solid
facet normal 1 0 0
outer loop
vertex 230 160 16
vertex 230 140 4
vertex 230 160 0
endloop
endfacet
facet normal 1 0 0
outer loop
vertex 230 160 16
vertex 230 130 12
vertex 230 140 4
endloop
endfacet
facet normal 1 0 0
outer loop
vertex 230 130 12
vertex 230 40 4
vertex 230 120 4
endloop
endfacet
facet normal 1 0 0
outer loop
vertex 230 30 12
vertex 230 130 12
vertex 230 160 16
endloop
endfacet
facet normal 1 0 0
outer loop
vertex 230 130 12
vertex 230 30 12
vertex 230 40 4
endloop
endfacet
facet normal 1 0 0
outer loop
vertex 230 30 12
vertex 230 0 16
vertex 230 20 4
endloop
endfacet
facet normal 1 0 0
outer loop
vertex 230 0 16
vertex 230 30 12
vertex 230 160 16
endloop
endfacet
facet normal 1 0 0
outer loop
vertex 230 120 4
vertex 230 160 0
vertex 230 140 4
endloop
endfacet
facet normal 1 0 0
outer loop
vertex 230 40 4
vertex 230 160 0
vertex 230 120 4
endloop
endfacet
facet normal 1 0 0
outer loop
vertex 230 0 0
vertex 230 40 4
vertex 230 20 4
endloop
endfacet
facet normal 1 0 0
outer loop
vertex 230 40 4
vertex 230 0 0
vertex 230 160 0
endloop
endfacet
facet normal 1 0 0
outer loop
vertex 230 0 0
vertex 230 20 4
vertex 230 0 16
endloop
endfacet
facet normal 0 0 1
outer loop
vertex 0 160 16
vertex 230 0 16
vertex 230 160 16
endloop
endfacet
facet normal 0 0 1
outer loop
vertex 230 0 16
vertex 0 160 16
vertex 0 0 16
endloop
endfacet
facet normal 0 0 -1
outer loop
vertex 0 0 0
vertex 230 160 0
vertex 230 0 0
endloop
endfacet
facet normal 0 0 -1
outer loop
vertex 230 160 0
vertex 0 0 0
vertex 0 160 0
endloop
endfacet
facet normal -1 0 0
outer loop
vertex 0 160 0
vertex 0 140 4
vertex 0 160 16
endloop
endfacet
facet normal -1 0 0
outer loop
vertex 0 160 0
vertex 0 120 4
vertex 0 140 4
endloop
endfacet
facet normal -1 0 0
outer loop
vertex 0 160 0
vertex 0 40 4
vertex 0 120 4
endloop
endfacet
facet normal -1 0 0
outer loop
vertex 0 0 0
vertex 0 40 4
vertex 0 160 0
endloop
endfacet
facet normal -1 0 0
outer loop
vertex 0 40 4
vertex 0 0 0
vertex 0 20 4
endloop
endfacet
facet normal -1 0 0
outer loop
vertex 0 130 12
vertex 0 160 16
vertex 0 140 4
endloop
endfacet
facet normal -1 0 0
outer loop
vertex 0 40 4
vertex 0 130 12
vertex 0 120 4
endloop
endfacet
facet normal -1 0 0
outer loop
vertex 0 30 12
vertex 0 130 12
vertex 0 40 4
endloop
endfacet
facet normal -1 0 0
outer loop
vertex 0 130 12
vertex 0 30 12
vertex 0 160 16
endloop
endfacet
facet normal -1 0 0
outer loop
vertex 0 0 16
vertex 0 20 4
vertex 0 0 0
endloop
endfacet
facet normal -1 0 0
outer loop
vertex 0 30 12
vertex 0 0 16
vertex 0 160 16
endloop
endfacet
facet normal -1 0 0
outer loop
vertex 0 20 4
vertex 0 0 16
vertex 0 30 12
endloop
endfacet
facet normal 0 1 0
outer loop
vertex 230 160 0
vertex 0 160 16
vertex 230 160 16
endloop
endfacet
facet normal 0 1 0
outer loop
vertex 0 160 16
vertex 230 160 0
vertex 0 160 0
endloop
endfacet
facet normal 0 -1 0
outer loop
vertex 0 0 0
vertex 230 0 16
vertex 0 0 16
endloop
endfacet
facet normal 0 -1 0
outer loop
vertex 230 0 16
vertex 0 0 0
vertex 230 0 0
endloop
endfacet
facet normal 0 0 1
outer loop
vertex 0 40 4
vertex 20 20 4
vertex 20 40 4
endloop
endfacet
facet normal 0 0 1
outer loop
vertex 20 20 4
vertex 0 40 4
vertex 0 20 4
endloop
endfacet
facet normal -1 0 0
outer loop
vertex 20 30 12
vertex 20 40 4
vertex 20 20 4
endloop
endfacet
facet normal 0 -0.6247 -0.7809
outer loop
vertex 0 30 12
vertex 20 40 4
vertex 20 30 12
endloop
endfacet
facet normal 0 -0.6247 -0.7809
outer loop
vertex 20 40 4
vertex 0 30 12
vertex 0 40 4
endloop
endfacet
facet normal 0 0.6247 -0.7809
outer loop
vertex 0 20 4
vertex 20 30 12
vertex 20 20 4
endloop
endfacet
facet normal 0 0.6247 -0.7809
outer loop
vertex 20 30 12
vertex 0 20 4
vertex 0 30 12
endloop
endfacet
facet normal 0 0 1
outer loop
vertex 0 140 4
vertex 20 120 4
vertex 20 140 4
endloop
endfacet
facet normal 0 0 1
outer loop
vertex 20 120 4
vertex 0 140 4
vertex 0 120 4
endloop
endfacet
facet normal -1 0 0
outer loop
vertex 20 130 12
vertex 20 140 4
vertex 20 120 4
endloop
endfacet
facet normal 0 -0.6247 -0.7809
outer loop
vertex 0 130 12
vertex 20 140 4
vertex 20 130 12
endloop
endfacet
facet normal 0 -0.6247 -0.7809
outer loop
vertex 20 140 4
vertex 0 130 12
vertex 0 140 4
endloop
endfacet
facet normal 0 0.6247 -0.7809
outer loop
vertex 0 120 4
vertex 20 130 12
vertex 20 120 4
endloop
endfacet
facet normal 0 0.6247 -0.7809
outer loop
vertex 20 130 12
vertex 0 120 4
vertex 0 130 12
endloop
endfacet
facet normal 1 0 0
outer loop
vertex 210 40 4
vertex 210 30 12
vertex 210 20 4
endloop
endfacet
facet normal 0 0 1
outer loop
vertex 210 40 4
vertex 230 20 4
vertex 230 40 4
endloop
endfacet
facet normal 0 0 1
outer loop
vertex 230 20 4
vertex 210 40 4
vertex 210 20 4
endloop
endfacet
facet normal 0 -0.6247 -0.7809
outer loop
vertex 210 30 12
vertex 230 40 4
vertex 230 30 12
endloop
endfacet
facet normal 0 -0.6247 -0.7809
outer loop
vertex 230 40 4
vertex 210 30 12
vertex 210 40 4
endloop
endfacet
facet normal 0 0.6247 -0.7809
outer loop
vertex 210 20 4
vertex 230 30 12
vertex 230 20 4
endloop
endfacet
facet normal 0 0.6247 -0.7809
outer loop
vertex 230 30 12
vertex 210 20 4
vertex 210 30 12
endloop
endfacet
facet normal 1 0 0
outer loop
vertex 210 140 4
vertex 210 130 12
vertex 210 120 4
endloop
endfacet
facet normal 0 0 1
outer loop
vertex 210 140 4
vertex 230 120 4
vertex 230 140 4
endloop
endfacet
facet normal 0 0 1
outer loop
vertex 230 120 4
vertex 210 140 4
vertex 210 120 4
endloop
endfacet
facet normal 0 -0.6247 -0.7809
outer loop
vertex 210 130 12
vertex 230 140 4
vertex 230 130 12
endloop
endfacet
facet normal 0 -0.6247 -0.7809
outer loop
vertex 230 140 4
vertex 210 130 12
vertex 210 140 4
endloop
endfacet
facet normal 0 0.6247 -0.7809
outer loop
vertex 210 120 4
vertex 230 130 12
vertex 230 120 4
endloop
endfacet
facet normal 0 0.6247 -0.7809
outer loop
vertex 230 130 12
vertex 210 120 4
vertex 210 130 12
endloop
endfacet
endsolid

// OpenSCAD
$fn = 48;


difference() {
	cube(size = [230, 160, 16]);
	translate(v = [0, 20, 4.0000000000]) {
		rotate(a = [90, 0, 0]) {
			rotate(a = [0, 90, 0]) {
				linear_extrude(height = 20) {
					polygon(points = [[0, 0], [20, 0], [10.0000000000, 8]]);
				}
			}
		}
	}
	translate(v = [0, 120, 4.0000000000]) {
		rotate(a = [90, 0, 0]) {
			rotate(a = [0, 90, 0]) {
				linear_extrude(height = 20) {
					polygon(points = [[0, 0], [20, 0], [10.0000000000, 8]]);
				}
			}
		}
	}
	translate(v = [210, 20, 4.0000000000]) {
		rotate(a = [90, 0, 0]) {
			rotate(a = [0, 90, 0]) {
				linear_extrude(height = 20) {
					polygon(points = [[0, 0], [20, 0], [10.0000000000, 8]]);
				}
			}
		}
	}
	translate(v = [210, 120, 4.0000000000]) {
		rotate(a = [90, 0, 0]) {
			rotate(a = [0, 90, 0]) {
				linear_extrude(height = 20) {
					polygon(points = [[0, 0], [20, 0], [10.0000000000, 8]]);
				}
			}
		}
	}
}
